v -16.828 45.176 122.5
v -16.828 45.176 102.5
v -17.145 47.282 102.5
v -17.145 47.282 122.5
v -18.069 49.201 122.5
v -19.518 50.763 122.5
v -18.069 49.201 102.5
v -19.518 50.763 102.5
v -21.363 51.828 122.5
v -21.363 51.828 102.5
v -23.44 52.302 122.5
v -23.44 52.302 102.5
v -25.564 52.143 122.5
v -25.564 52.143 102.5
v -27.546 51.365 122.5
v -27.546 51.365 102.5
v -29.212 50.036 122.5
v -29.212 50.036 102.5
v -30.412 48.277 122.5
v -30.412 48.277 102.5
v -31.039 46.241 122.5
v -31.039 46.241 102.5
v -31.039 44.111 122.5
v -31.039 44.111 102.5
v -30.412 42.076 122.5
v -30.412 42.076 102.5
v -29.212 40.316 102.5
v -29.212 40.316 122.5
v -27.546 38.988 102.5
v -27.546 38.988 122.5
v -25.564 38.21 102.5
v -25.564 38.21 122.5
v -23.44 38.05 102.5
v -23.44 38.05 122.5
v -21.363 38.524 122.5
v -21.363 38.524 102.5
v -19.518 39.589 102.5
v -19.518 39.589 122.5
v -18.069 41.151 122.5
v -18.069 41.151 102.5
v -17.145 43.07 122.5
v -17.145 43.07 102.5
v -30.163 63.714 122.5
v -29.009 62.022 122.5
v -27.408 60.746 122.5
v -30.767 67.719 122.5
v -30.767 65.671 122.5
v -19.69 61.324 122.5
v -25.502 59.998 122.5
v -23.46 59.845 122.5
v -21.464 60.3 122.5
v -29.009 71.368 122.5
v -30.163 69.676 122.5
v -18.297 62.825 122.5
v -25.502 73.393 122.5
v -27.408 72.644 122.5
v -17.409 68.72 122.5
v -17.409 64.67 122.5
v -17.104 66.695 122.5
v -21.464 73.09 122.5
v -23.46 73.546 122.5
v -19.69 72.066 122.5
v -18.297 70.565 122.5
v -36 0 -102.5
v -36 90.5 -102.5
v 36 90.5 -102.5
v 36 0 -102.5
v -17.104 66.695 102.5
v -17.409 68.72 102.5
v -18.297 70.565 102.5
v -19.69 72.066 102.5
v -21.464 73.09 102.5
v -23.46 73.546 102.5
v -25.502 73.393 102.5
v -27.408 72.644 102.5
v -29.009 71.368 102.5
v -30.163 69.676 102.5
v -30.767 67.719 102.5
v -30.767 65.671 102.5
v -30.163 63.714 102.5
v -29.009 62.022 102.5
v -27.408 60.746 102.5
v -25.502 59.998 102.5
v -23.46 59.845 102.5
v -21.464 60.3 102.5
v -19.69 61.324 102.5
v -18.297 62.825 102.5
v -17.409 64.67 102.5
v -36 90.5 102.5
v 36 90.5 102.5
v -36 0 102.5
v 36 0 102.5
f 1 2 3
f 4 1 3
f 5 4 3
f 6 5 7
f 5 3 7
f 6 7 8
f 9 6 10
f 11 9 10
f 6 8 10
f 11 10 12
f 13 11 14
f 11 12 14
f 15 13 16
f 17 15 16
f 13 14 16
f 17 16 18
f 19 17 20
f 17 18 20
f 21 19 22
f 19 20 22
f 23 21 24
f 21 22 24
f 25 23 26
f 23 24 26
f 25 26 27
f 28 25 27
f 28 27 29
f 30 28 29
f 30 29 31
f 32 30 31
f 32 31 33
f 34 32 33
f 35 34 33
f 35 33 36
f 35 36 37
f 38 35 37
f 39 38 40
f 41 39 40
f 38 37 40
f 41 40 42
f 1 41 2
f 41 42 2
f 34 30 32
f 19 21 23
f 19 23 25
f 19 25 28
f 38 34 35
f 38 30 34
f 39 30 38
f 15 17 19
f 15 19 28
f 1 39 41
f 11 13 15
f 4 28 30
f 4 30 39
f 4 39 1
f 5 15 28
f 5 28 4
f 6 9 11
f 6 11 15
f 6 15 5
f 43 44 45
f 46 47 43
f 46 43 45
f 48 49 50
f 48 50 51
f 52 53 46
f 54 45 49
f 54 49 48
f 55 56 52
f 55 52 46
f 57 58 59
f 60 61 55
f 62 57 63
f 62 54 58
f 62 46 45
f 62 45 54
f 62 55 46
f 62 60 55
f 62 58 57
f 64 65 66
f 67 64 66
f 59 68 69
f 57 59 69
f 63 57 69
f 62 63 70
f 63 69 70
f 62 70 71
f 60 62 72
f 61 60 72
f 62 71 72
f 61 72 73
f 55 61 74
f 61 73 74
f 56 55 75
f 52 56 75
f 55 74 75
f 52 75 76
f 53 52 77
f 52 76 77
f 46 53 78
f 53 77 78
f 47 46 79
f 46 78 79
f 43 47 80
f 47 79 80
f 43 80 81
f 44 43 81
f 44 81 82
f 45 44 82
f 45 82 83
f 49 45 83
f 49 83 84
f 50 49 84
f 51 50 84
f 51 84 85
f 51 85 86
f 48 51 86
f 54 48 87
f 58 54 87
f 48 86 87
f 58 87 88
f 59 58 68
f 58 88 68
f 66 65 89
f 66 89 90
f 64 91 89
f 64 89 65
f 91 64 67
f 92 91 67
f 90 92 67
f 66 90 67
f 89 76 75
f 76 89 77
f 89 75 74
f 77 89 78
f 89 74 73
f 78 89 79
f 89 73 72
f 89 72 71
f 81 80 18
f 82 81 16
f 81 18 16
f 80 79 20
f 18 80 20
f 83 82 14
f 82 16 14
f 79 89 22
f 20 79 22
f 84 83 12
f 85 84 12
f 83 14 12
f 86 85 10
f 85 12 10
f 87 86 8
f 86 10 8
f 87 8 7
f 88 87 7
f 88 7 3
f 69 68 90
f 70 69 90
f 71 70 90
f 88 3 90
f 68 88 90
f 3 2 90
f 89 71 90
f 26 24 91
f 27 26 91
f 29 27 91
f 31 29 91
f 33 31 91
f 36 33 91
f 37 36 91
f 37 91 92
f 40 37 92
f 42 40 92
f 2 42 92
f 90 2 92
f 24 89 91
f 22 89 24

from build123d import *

# Parameters (mm, degrees)
SKETCH1_W           = 72
SKETCH1_H           = 205
BOSS_EXTRUDE1_DEPTH = 90.5
SKETCH3_R           = 6.869769894
SKETCH3_R_2         = 7.145756099
BOSS_EXTRUDE2_DEPTH = 20


with BuildPart() as part:
    # Sketch1 → Boss-Extrude1 (new body)
    with BuildSketch(Plane(origin=(0, 0, 0), x_dir=(1, 0, 0), z_dir=(0, 1, 0))):
        Rectangle(SKETCH1_W, SKETCH1_H)
    extrude(amount=BOSS_EXTRUDE1_DEPTH)

    # Sketch3 → Boss-Extrude2 (add)
    with BuildSketch(Plane.XY.offset(102.5)):
        with Locations((-23.973543761, 66.695088825)):
            Circle(SKETCH3_R)
        with Locations((-23.973543761, 45.176113887)):
            Circle(SKETCH3_R_2)
    extrude(amount=BOSS_EXTRUDE2_DEPTH)


solid = part.part
